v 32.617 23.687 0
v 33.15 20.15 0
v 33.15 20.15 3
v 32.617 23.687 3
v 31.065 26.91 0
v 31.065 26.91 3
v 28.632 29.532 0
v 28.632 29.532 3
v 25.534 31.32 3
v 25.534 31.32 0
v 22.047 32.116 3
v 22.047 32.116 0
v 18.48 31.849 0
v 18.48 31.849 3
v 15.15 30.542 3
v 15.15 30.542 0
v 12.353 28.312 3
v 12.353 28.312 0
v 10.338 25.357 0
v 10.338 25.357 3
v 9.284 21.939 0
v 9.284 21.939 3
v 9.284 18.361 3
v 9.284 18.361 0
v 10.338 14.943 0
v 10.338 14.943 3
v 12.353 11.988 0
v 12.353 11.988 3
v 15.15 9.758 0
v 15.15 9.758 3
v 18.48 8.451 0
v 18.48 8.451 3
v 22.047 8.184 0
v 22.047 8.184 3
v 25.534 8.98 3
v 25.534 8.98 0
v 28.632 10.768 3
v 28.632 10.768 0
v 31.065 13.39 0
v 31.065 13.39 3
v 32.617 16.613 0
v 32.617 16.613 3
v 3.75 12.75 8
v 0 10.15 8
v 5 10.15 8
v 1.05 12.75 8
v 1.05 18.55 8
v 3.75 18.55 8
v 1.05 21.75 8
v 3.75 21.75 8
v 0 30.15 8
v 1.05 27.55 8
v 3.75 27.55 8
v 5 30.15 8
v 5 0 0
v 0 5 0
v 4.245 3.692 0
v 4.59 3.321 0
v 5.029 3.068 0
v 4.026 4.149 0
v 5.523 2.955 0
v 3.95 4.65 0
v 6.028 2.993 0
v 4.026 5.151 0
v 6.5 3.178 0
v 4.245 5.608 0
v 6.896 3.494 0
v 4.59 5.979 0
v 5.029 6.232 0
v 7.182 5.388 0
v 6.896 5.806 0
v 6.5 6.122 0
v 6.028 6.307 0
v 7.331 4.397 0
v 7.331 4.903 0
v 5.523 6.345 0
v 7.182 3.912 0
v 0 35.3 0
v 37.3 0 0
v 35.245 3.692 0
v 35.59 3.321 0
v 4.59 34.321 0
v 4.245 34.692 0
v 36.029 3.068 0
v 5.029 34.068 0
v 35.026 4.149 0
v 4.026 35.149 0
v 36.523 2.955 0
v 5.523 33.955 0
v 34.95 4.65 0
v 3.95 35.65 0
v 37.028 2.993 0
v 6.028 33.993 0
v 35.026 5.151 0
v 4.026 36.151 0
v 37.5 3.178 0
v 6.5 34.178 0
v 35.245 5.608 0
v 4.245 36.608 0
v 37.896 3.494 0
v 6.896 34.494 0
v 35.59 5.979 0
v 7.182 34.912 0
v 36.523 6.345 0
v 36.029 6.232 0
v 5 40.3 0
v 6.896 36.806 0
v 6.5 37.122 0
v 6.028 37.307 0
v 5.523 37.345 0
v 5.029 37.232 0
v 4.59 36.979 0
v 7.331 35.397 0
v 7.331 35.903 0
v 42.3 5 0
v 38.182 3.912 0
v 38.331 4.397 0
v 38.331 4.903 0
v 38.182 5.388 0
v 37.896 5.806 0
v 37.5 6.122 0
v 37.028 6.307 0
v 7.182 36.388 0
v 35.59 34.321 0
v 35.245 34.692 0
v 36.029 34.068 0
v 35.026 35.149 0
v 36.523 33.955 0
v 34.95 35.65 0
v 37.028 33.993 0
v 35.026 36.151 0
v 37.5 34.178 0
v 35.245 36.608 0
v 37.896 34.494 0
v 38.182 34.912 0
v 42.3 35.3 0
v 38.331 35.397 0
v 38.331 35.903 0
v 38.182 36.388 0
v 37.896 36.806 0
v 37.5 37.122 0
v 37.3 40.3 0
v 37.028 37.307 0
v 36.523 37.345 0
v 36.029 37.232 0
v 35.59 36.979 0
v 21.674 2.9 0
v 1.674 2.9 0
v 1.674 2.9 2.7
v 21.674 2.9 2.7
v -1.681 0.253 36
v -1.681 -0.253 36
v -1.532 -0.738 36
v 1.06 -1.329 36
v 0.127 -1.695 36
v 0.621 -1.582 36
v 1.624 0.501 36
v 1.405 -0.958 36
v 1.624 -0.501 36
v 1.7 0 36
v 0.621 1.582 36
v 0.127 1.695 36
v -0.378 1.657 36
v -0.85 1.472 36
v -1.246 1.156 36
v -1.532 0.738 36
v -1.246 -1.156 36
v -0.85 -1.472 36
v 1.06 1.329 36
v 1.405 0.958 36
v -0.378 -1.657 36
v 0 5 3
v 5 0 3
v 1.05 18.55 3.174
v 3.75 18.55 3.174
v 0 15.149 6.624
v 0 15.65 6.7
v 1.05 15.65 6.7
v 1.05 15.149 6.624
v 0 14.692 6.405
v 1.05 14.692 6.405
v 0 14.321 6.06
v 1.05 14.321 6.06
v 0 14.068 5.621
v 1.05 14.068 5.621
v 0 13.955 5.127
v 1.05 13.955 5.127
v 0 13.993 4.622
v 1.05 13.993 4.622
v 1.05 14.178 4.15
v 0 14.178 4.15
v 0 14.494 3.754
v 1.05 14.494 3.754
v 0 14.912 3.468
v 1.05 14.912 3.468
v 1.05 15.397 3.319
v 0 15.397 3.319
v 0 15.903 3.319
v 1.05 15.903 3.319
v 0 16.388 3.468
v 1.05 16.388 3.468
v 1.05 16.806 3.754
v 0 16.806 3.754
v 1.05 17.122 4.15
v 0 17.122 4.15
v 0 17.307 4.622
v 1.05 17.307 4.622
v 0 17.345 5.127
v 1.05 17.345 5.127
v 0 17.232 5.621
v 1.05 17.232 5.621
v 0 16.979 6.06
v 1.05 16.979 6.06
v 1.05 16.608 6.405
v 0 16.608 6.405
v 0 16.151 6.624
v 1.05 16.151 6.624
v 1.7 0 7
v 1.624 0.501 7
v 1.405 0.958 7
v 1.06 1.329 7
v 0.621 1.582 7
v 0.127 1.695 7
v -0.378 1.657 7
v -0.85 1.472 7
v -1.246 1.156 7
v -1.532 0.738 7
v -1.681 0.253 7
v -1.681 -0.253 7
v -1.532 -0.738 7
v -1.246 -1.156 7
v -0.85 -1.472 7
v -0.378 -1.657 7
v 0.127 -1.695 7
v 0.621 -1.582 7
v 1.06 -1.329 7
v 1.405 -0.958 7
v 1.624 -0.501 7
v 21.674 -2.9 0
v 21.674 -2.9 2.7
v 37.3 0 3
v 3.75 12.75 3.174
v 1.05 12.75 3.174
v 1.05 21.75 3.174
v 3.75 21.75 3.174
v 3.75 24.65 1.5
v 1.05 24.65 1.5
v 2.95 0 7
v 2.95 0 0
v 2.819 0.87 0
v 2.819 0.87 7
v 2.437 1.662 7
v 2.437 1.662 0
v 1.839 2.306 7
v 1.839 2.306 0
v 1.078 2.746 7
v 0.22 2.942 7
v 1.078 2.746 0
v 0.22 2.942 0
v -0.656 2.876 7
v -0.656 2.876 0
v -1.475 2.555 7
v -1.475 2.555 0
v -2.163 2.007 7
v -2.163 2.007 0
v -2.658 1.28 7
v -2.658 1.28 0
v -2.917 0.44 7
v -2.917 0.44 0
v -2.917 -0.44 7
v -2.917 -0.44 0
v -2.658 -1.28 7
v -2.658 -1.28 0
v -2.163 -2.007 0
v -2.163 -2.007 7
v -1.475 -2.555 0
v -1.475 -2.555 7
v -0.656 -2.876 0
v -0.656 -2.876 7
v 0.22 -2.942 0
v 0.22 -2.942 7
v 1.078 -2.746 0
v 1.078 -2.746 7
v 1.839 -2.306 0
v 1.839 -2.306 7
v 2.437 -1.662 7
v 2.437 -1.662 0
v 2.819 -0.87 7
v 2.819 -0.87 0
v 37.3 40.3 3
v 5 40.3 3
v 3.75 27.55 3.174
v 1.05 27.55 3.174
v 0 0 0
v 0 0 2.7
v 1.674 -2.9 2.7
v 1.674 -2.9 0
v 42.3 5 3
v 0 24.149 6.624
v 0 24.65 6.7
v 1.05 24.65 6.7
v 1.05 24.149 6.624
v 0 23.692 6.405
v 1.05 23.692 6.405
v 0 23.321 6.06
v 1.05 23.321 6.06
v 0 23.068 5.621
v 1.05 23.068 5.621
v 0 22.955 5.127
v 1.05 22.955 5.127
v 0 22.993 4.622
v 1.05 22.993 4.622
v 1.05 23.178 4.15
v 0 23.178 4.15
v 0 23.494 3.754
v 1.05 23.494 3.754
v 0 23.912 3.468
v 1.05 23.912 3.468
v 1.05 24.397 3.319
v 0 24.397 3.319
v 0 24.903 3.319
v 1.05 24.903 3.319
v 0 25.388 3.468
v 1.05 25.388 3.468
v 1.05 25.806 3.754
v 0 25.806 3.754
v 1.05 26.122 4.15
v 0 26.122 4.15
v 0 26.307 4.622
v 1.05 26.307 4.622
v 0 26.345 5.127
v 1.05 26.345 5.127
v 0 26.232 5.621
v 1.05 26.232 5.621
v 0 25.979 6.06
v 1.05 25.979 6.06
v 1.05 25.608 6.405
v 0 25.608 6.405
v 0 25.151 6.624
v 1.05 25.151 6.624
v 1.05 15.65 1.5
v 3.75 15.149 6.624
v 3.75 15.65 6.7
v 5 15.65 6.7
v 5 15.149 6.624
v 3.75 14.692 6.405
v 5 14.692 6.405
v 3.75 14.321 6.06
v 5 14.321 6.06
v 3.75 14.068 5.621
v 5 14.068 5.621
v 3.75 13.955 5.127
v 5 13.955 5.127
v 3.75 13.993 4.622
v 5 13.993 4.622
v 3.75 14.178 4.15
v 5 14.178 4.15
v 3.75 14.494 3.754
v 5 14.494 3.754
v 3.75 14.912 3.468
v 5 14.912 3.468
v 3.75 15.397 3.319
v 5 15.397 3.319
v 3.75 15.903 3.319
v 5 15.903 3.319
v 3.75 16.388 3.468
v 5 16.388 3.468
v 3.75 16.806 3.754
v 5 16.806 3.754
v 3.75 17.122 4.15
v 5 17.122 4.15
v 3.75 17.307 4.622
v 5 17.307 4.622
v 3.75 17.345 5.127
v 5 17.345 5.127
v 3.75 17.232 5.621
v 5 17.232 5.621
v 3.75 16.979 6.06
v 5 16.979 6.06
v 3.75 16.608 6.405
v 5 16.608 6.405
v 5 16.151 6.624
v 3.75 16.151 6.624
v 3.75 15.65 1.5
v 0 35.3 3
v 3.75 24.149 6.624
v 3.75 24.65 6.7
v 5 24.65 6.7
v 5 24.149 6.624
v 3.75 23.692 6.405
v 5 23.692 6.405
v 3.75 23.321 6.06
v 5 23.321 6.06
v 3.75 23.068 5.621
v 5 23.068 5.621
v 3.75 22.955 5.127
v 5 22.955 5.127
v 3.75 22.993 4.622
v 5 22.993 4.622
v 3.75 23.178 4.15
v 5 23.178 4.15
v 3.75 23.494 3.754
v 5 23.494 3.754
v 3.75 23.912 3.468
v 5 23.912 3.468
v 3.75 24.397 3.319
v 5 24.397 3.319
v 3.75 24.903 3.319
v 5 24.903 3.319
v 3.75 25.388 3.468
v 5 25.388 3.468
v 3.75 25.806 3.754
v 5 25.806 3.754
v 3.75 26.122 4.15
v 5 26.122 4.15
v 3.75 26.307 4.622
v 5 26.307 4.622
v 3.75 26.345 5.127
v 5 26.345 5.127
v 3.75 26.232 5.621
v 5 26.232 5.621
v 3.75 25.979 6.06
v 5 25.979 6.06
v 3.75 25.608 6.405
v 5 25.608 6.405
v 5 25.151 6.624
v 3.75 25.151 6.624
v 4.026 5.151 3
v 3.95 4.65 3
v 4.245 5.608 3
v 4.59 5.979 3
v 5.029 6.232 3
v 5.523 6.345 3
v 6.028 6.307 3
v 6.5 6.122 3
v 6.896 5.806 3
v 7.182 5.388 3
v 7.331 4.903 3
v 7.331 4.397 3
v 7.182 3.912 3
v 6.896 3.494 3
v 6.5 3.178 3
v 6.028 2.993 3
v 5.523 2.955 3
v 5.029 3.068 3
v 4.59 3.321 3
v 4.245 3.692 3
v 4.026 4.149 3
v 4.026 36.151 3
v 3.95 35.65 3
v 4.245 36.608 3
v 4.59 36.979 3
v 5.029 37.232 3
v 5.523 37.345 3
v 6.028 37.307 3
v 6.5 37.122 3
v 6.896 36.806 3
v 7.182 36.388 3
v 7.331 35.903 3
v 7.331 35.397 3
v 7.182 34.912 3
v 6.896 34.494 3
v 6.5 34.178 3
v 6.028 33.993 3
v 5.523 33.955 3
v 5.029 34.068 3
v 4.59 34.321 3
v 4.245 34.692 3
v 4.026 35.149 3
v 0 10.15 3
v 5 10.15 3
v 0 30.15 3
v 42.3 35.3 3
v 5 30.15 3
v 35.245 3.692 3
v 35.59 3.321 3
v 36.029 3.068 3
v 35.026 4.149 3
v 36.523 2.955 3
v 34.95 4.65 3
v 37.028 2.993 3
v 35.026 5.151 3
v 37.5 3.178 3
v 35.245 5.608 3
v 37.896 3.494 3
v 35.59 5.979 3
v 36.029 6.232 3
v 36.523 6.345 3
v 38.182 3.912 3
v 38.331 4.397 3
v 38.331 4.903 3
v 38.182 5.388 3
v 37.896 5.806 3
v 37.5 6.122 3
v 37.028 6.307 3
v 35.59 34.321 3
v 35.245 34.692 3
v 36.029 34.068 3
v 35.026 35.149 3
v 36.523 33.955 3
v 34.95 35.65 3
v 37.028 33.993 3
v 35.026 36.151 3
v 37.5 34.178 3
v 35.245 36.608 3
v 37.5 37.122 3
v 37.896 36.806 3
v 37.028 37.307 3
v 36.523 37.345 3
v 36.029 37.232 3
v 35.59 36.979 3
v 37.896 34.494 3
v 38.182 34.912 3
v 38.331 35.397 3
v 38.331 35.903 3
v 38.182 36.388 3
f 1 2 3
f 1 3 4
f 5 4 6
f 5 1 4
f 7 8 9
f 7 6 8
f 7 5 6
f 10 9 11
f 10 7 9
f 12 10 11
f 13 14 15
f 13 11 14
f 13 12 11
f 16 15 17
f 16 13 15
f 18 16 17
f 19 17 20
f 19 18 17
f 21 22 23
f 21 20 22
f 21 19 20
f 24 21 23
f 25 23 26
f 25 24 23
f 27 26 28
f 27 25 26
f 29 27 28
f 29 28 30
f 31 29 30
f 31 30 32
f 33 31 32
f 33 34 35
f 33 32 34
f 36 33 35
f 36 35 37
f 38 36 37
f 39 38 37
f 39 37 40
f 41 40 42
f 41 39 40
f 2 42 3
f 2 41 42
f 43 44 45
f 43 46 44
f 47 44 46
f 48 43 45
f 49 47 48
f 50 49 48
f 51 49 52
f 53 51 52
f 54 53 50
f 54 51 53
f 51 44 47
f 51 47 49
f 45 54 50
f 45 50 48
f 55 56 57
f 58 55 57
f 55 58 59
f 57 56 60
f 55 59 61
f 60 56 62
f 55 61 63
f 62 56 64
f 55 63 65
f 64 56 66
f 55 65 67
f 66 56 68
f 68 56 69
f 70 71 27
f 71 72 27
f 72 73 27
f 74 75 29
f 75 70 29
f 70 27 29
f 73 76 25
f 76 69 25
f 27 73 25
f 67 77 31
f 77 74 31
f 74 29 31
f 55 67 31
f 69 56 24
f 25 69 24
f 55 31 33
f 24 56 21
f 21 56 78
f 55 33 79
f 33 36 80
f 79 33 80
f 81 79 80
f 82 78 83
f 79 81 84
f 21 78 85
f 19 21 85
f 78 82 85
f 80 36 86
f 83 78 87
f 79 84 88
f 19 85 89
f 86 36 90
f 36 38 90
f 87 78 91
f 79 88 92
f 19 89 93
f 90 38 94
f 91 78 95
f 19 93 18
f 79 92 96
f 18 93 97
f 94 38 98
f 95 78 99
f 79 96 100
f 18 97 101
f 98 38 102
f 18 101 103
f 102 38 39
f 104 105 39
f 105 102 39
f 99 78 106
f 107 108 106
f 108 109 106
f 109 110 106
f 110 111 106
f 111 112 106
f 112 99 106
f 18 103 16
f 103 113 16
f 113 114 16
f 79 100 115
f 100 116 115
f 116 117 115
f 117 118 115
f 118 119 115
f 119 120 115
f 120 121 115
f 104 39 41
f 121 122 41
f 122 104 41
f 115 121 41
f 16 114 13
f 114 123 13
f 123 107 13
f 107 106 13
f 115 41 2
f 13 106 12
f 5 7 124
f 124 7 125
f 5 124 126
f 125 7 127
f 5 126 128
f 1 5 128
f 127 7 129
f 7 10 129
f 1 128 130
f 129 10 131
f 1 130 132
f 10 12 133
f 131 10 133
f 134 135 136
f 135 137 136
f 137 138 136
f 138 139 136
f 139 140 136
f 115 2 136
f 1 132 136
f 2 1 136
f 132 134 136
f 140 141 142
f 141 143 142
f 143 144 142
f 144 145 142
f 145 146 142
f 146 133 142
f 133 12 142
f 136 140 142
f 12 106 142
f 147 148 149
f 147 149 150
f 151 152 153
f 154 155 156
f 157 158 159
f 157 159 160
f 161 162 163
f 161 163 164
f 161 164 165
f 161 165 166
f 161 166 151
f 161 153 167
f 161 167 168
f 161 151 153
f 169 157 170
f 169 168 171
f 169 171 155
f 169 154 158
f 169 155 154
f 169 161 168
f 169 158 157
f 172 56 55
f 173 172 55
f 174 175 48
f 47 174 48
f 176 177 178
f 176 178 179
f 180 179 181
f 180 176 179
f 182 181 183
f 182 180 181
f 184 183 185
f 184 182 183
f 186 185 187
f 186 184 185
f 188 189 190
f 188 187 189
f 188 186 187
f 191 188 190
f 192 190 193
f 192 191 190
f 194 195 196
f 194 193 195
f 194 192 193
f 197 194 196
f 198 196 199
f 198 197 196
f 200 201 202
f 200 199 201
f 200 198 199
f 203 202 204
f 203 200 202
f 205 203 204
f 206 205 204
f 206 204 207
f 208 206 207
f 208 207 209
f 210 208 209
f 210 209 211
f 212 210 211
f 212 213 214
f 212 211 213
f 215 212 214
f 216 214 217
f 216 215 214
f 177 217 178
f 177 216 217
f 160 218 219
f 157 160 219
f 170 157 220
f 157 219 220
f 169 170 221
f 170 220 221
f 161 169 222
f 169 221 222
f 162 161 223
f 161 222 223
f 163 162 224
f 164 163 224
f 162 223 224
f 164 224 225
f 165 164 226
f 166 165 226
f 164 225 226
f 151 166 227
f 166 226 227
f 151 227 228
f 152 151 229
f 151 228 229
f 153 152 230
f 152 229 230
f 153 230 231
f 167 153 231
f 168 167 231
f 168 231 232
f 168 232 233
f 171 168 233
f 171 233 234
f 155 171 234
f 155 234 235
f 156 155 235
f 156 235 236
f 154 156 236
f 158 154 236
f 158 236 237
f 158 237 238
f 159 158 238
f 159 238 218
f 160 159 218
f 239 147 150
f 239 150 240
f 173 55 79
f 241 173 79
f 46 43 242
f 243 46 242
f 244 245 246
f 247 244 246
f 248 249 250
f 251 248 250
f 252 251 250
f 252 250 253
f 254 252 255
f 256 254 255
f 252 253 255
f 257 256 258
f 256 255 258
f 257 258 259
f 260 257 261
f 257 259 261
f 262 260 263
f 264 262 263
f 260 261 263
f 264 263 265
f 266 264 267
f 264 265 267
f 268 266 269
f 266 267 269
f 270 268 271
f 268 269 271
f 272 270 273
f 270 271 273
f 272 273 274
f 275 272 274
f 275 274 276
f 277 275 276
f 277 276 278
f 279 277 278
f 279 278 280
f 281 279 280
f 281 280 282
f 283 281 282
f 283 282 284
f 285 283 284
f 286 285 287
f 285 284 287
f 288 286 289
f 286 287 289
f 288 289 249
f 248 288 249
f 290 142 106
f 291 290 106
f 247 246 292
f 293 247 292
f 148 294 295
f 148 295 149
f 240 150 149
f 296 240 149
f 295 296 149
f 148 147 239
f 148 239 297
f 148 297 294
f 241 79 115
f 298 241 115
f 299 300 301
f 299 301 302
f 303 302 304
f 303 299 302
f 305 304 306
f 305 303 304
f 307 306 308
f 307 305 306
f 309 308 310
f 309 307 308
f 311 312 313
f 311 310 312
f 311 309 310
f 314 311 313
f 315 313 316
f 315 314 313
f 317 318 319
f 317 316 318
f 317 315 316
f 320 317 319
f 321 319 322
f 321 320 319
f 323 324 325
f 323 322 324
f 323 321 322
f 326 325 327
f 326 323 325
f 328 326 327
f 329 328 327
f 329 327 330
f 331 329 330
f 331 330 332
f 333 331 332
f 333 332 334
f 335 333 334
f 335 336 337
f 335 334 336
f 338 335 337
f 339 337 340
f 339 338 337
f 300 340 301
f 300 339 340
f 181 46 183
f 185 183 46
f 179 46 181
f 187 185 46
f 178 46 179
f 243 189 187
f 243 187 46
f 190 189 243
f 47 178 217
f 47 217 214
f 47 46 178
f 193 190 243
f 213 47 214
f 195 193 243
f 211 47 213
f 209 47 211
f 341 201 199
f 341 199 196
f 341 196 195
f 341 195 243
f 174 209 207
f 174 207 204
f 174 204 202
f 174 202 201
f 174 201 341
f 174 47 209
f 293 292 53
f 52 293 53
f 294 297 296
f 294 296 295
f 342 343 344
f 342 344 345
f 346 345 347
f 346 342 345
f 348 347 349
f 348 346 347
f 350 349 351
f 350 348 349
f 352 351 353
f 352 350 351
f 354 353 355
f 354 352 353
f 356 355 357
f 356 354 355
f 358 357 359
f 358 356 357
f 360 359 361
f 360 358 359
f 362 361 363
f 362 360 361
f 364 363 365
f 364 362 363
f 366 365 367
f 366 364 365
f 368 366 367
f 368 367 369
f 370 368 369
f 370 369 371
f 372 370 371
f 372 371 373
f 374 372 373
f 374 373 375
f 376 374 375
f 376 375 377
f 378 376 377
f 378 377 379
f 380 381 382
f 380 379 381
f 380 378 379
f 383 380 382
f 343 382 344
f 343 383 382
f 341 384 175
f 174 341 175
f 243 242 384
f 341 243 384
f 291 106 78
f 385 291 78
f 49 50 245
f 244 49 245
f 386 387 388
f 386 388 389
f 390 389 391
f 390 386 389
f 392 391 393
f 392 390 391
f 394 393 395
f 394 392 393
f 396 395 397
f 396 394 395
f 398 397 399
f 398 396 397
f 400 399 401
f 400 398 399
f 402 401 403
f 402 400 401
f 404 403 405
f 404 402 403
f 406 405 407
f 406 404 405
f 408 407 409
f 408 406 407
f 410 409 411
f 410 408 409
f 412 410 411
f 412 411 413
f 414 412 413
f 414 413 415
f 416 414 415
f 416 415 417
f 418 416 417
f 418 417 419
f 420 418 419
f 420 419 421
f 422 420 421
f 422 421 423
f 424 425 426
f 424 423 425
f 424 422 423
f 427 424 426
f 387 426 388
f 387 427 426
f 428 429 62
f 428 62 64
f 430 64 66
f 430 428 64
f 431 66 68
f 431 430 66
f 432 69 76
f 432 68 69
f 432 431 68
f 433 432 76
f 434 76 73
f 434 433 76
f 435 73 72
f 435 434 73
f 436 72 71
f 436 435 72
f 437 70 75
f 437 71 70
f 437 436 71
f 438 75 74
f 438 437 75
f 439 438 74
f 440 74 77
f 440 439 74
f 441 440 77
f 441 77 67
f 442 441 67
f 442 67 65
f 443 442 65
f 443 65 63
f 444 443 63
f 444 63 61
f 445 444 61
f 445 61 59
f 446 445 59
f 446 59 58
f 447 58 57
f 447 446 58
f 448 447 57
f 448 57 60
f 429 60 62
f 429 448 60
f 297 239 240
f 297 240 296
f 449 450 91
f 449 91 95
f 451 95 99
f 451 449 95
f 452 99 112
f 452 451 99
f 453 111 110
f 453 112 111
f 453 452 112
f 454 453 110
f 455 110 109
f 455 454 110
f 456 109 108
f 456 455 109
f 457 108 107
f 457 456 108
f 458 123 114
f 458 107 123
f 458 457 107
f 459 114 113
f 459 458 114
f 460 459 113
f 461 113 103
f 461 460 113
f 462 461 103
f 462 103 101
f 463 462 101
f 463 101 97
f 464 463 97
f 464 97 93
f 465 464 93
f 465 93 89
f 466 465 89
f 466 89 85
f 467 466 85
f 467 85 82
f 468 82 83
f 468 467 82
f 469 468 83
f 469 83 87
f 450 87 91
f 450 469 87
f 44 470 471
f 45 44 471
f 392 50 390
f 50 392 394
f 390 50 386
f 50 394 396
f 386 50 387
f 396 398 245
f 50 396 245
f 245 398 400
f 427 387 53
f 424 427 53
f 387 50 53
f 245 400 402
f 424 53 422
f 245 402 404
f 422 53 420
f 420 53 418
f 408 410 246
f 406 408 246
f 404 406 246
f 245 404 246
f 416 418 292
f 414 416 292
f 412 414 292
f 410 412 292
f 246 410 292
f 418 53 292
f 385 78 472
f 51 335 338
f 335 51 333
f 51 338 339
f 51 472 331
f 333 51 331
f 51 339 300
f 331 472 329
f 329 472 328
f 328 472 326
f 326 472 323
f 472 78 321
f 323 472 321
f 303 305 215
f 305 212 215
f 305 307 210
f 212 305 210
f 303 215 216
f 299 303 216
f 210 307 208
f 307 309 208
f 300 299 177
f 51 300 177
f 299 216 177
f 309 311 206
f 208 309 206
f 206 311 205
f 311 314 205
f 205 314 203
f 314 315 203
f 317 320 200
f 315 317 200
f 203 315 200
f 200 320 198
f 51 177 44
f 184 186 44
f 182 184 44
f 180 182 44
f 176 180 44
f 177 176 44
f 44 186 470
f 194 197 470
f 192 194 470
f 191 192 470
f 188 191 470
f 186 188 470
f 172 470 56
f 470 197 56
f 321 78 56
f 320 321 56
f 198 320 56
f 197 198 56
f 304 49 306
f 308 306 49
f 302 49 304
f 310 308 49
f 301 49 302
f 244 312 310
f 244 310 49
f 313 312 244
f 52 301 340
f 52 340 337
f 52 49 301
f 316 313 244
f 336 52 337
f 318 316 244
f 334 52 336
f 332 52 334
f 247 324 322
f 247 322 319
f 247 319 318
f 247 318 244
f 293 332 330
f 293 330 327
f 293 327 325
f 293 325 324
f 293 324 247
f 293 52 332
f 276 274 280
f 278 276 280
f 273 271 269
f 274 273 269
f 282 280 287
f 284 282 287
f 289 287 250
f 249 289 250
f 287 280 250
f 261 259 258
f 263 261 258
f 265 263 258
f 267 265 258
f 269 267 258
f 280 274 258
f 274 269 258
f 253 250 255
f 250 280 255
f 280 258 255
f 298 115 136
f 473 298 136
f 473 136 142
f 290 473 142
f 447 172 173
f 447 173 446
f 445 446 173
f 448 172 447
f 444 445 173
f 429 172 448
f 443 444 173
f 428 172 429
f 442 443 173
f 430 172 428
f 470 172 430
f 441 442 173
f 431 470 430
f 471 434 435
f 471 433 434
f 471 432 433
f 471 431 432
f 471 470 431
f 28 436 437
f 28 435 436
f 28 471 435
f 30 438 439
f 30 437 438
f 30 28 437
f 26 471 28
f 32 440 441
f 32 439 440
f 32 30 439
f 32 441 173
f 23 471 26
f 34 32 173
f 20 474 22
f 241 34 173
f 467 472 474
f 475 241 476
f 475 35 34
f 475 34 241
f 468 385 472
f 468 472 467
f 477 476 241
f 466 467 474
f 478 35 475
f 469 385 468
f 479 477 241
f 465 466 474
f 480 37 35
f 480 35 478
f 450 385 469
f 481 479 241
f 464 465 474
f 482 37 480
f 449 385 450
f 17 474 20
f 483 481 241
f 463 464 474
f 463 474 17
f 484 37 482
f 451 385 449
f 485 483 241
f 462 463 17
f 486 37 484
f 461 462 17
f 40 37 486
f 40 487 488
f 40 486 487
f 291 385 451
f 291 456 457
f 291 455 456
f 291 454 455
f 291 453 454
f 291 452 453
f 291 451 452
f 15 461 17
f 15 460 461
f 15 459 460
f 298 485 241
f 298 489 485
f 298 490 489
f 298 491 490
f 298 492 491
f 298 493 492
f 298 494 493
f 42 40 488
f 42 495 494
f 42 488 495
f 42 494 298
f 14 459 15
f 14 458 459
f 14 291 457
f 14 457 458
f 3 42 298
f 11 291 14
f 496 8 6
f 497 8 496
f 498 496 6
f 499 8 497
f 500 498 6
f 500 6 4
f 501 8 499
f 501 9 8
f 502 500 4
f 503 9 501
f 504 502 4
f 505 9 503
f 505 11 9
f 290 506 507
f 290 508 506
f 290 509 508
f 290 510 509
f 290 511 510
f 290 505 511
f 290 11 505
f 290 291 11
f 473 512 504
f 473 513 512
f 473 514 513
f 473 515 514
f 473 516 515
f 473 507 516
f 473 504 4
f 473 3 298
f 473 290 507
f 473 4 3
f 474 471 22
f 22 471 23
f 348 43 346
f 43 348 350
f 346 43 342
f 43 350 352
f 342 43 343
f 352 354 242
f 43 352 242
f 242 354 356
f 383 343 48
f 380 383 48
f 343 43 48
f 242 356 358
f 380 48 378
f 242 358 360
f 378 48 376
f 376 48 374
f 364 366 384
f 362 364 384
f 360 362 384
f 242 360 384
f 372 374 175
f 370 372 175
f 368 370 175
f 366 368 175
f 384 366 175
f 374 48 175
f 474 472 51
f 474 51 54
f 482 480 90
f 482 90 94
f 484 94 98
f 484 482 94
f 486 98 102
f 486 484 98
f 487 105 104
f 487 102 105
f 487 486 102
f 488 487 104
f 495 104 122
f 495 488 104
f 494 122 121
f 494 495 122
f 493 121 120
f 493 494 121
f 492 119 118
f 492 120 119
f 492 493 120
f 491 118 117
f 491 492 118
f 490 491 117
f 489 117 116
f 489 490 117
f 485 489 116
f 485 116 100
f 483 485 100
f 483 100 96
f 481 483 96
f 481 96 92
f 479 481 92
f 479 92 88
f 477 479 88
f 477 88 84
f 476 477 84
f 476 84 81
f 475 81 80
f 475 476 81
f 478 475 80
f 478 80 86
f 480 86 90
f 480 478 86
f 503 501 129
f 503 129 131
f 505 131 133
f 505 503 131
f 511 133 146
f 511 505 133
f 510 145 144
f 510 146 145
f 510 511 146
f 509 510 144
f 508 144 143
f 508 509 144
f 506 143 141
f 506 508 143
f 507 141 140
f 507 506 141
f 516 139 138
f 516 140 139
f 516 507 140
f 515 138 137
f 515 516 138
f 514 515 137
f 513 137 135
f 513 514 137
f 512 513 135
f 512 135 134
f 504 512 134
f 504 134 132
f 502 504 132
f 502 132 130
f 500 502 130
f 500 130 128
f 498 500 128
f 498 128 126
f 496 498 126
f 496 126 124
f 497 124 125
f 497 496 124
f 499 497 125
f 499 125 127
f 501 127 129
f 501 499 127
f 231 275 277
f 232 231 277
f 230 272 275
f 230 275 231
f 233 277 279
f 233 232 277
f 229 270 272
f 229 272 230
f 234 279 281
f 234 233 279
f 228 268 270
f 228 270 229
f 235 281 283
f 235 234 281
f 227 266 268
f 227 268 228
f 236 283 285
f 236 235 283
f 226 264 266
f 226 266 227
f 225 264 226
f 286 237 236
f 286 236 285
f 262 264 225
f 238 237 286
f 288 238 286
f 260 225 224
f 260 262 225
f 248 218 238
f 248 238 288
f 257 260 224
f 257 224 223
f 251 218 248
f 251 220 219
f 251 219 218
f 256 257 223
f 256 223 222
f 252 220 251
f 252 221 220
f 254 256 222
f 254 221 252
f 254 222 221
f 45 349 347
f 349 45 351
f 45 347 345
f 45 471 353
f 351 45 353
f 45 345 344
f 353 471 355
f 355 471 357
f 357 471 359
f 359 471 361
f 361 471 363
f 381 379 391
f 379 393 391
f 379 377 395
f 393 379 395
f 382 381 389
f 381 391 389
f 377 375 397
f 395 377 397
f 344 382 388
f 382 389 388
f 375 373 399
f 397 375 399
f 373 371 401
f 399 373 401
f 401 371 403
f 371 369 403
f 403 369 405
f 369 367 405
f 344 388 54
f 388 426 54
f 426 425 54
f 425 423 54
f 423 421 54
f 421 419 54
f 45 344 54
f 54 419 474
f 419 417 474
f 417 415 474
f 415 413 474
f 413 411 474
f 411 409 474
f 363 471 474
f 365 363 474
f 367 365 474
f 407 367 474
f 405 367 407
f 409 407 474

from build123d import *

# Parameters (mm, degrees)
CYLINDER_R               = 2.95
CYLINDER_DEPTH           = 7
CYLINDER001_R            = 1.7
CYLINDER001_DEPTH        = 30
PAD002_DEPTH             = 2.7
CLONE242_PLACEMENT_ANGLE = 180
CYLINDER1023_R           = 12
CYLINDER1023_DEPTH       = 10
CLONE243_PLACEMENT_ANGLE = 180
CLONE244_PLACEMENT_ANGLE = 180
CLONE245_PITCH_ANGLE     = -90
CLONE245_PLACEMENT_ANGLE = -180
CLONE248_PITCH_ANGLE     = -90
CLONE246_PITCH_ANGLE     = -90
CLONE246_PLACEMENT_ANGLE = -180
CLONE247_PITCH_ANGLE     = -90
CLONE241_PLACEMENT_ANGLE = 180
BOX253_W                 = 5
BOX253_H                 = 20
BOX253_DEPTH             = 5
PAD033_DEPTH             = 3


with BuildPart() as m3bolthead:
    # Cylinder → Cylinder (new body)
    with BuildSketch(Plane.XY):
        Circle(CYLINDER_R)
    extrude(amount=CYLINDER_DEPTH)


with BuildPart() as m3bolt:
    # Cylinder001 → Cylinder001 (new body)
    with BuildSketch(Plane.XY.offset(6)):
        Circle(CYLINDER001_R)
    extrude(amount=CYLINDER001_DEPTH)

    # Fusion: union M3BoltHead
    add(m3bolthead.part)


with BuildPart() as m3nuthousing:
    # Sketch003 → Pad002 (new body)
    with BuildSketch(Plane.XY):
        Polygon((0, 0), (1.674316, 2.9), (21.674316, 2.9), (21.674316, -2.9), (1.674316, -2.9), align=None)
    extrude(amount=PAD002_DEPTH)


with BuildPart() as clone_of_m3bolt078:
    # Clone242 base: copy of M3Bolt
    add(m3bolt.part)


with BuildPart() as clone_of_m3bolt078_1:
    # Clone242 placement: moved
    add(clone_of_m3bolt078.part.moved(Location((36.65, 4.65, 34))).rotate(Axis((36.65, 4.65, 34), (0, 1, 0)), CLONE242_PLACEMENT_ANGLE))


with BuildPart() as cylinder1059:
    # Cylinder1023 → Cylinder1023 (new body)
    with BuildSketch(Plane(origin=(21.15, 20.15, -2), x_dir=(1, 0, 0), z_dir=(0, 0, 1))):
        Circle(CYLINDER1023_R)
    extrude(amount=CYLINDER1023_DEPTH)


with BuildPart() as clone_of_m3bolt079:
    # Clone243 base: copy of M3Bolt
    add(m3bolt.part)


with BuildPart() as clone_of_m3bolt079_1:
    # Clone243 placement: moved
    add(clone_of_m3bolt079.part.moved(Location((5.65, 35.65, 34))).rotate(Axis((5.65, 35.65, 34), (0, 1, 0)), CLONE243_PLACEMENT_ANGLE))


with BuildPart() as clone_of_m3bolt080:
    # Clone244 base: copy of M3Bolt
    add(m3bolt.part)


with BuildPart() as clone_of_m3bolt080_1:
    # Clone244 placement: moved
    add(clone_of_m3bolt080.part.moved(Location((36.65, 35.65, 34))).rotate(Axis((36.65, 35.65, 34), (0, 1, 0)), CLONE244_PLACEMENT_ANGLE))


with BuildPart() as clone_of_m3bolt081:
    # Clone245 base: copy of M3Bolt
    add(m3bolt.part)


with BuildPart() as clone_of_m3bolt081_1:
    # Clone245 pitch: moved
    add(clone_of_m3bolt081.part.rotate(Axis((0, 0, 0), (0, 1, 0)), CLONE245_PITCH_ANGLE))


with BuildPart() as clone_of_m3bolt081_2:
    # Clone245 placement: moved
    add(clone_of_m3bolt081_1.part.moved(Location((-26, 24.65, 5))).rotate(Axis((-26, 24.65, 5), (0, 0, 1)), CLONE245_PLACEMENT_ANGLE))


with BuildPart() as clone_of_m3nuthousing023:
    # Clone248 base: copy of M3NutHousing
    add(m3nuthousing.part)


with BuildPart() as clone_of_m3nuthousing023_1:
    # Clone248 pitch: moved
    add(clone_of_m3nuthousing023.part.rotate(Axis((0, 0, 0), (0, 1, 0)), CLONE248_PITCH_ANGLE))


with BuildPart() as clone_of_m3nuthousing023_2:
    # Clone248 placement: moved
    add(clone_of_m3nuthousing023_1.part.moved(Location((3.75, 15.65, 1.5))))


with BuildPart() as clone_of_m3bolt082:
    # Clone246 base: copy of M3Bolt
    add(m3bolt.part)


with BuildPart() as clone_of_m3bolt082_1:
    # Clone246 pitch: moved
    add(clone_of_m3bolt082.part.rotate(Axis((0, 0, 0), (0, 1, 0)), CLONE246_PITCH_ANGLE))


with BuildPart() as clone_of_m3bolt082_2:
    # Clone246 placement: moved
    add(clone_of_m3bolt082_1.part.moved(Location((-26, 15.65, 5))).rotate(Axis((-26, 15.65, 5), (0, 0, 1)), CLONE246_PLACEMENT_ANGLE))


with BuildPart() as clone_of_m3nuthousing022:
    # Clone247 base: copy of M3NutHousing
    add(m3nuthousing.part)


with BuildPart() as clone_of_m3nuthousing022_1:
    # Clone247 pitch: moved
    add(clone_of_m3nuthousing022.part.rotate(Axis((0, 0, 0), (0, 1, 0)), CLONE247_PITCH_ANGLE))


with BuildPart() as clone_of_m3nuthousing022_2:
    # Clone247 placement: moved
    add(clone_of_m3nuthousing022_1.part.moved(Location((3.75, 24.65, 1.5))))


with BuildPart() as fusion086:
    # Clone241 base: copy of M3Bolt
    add(m3bolt.part)


with BuildPart() as fusion086_1:
    # Clone241 placement: moved
    add(fusion086.part.moved(Location((5.65, 4.65, 34))).rotate(Axis((5.65, 4.65, 34), (0, 1, 0)), CLONE241_PLACEMENT_ANGLE))

    # Fusion086: union Clone of M3Bolt078, Cylinder1059, Clone of M3Bolt079, Clone of M3Bolt080, Clone of M3Bolt081, Clone of M3NutHousing023, Clone of M3Bolt082, Clone of M3NutHousing022
    add(clone_of_m3bolt078_1.part)
    add(cylinder1059.part)
    add(clone_of_m3bolt079_1.part)
    add(clone_of_m3bolt080_1.part)
    add(clone_of_m3bolt081_2.part)
    add(clone_of_m3nuthousing023_2.part)
    add(clone_of_m3bolt082_2.part)
    add(clone_of_m3nuthousing022_2.part)


with BuildPart() as cube017:
    # Box253 → Box253 (new body)
    with BuildSketch(Plane(origin=(0, 10.15, 3), x_dir=(1, 0, 0), z_dir=(0, 0, 1))):
        with Locations((2.5, 10)):
            Rectangle(BOX253_W, BOX253_H)
    extrude(amount=BOX253_DEPTH)


with BuildPart() as art4motorfix:
    # Sketch045 → Pad033 (new body)
    with BuildSketch(Plane.XY):
        Polygon((42.3, 5), (42.3, 35.3), (37.3, 40.3), (5, 40.3), (0, 35.3), (0, 5), (5, 0), (37.3, 0), align=None)
    extrude(amount=PAD033_DEPTH)

    # Fusion085: union Cube017
    add(cube017.part)

    # Cut073: cut Fusion086
    add(fusion086_1.part, mode=Mode.SUBTRACT)


solid = Compound([m3bolt.part, m3nuthousing.part, art4motorfix.part])
